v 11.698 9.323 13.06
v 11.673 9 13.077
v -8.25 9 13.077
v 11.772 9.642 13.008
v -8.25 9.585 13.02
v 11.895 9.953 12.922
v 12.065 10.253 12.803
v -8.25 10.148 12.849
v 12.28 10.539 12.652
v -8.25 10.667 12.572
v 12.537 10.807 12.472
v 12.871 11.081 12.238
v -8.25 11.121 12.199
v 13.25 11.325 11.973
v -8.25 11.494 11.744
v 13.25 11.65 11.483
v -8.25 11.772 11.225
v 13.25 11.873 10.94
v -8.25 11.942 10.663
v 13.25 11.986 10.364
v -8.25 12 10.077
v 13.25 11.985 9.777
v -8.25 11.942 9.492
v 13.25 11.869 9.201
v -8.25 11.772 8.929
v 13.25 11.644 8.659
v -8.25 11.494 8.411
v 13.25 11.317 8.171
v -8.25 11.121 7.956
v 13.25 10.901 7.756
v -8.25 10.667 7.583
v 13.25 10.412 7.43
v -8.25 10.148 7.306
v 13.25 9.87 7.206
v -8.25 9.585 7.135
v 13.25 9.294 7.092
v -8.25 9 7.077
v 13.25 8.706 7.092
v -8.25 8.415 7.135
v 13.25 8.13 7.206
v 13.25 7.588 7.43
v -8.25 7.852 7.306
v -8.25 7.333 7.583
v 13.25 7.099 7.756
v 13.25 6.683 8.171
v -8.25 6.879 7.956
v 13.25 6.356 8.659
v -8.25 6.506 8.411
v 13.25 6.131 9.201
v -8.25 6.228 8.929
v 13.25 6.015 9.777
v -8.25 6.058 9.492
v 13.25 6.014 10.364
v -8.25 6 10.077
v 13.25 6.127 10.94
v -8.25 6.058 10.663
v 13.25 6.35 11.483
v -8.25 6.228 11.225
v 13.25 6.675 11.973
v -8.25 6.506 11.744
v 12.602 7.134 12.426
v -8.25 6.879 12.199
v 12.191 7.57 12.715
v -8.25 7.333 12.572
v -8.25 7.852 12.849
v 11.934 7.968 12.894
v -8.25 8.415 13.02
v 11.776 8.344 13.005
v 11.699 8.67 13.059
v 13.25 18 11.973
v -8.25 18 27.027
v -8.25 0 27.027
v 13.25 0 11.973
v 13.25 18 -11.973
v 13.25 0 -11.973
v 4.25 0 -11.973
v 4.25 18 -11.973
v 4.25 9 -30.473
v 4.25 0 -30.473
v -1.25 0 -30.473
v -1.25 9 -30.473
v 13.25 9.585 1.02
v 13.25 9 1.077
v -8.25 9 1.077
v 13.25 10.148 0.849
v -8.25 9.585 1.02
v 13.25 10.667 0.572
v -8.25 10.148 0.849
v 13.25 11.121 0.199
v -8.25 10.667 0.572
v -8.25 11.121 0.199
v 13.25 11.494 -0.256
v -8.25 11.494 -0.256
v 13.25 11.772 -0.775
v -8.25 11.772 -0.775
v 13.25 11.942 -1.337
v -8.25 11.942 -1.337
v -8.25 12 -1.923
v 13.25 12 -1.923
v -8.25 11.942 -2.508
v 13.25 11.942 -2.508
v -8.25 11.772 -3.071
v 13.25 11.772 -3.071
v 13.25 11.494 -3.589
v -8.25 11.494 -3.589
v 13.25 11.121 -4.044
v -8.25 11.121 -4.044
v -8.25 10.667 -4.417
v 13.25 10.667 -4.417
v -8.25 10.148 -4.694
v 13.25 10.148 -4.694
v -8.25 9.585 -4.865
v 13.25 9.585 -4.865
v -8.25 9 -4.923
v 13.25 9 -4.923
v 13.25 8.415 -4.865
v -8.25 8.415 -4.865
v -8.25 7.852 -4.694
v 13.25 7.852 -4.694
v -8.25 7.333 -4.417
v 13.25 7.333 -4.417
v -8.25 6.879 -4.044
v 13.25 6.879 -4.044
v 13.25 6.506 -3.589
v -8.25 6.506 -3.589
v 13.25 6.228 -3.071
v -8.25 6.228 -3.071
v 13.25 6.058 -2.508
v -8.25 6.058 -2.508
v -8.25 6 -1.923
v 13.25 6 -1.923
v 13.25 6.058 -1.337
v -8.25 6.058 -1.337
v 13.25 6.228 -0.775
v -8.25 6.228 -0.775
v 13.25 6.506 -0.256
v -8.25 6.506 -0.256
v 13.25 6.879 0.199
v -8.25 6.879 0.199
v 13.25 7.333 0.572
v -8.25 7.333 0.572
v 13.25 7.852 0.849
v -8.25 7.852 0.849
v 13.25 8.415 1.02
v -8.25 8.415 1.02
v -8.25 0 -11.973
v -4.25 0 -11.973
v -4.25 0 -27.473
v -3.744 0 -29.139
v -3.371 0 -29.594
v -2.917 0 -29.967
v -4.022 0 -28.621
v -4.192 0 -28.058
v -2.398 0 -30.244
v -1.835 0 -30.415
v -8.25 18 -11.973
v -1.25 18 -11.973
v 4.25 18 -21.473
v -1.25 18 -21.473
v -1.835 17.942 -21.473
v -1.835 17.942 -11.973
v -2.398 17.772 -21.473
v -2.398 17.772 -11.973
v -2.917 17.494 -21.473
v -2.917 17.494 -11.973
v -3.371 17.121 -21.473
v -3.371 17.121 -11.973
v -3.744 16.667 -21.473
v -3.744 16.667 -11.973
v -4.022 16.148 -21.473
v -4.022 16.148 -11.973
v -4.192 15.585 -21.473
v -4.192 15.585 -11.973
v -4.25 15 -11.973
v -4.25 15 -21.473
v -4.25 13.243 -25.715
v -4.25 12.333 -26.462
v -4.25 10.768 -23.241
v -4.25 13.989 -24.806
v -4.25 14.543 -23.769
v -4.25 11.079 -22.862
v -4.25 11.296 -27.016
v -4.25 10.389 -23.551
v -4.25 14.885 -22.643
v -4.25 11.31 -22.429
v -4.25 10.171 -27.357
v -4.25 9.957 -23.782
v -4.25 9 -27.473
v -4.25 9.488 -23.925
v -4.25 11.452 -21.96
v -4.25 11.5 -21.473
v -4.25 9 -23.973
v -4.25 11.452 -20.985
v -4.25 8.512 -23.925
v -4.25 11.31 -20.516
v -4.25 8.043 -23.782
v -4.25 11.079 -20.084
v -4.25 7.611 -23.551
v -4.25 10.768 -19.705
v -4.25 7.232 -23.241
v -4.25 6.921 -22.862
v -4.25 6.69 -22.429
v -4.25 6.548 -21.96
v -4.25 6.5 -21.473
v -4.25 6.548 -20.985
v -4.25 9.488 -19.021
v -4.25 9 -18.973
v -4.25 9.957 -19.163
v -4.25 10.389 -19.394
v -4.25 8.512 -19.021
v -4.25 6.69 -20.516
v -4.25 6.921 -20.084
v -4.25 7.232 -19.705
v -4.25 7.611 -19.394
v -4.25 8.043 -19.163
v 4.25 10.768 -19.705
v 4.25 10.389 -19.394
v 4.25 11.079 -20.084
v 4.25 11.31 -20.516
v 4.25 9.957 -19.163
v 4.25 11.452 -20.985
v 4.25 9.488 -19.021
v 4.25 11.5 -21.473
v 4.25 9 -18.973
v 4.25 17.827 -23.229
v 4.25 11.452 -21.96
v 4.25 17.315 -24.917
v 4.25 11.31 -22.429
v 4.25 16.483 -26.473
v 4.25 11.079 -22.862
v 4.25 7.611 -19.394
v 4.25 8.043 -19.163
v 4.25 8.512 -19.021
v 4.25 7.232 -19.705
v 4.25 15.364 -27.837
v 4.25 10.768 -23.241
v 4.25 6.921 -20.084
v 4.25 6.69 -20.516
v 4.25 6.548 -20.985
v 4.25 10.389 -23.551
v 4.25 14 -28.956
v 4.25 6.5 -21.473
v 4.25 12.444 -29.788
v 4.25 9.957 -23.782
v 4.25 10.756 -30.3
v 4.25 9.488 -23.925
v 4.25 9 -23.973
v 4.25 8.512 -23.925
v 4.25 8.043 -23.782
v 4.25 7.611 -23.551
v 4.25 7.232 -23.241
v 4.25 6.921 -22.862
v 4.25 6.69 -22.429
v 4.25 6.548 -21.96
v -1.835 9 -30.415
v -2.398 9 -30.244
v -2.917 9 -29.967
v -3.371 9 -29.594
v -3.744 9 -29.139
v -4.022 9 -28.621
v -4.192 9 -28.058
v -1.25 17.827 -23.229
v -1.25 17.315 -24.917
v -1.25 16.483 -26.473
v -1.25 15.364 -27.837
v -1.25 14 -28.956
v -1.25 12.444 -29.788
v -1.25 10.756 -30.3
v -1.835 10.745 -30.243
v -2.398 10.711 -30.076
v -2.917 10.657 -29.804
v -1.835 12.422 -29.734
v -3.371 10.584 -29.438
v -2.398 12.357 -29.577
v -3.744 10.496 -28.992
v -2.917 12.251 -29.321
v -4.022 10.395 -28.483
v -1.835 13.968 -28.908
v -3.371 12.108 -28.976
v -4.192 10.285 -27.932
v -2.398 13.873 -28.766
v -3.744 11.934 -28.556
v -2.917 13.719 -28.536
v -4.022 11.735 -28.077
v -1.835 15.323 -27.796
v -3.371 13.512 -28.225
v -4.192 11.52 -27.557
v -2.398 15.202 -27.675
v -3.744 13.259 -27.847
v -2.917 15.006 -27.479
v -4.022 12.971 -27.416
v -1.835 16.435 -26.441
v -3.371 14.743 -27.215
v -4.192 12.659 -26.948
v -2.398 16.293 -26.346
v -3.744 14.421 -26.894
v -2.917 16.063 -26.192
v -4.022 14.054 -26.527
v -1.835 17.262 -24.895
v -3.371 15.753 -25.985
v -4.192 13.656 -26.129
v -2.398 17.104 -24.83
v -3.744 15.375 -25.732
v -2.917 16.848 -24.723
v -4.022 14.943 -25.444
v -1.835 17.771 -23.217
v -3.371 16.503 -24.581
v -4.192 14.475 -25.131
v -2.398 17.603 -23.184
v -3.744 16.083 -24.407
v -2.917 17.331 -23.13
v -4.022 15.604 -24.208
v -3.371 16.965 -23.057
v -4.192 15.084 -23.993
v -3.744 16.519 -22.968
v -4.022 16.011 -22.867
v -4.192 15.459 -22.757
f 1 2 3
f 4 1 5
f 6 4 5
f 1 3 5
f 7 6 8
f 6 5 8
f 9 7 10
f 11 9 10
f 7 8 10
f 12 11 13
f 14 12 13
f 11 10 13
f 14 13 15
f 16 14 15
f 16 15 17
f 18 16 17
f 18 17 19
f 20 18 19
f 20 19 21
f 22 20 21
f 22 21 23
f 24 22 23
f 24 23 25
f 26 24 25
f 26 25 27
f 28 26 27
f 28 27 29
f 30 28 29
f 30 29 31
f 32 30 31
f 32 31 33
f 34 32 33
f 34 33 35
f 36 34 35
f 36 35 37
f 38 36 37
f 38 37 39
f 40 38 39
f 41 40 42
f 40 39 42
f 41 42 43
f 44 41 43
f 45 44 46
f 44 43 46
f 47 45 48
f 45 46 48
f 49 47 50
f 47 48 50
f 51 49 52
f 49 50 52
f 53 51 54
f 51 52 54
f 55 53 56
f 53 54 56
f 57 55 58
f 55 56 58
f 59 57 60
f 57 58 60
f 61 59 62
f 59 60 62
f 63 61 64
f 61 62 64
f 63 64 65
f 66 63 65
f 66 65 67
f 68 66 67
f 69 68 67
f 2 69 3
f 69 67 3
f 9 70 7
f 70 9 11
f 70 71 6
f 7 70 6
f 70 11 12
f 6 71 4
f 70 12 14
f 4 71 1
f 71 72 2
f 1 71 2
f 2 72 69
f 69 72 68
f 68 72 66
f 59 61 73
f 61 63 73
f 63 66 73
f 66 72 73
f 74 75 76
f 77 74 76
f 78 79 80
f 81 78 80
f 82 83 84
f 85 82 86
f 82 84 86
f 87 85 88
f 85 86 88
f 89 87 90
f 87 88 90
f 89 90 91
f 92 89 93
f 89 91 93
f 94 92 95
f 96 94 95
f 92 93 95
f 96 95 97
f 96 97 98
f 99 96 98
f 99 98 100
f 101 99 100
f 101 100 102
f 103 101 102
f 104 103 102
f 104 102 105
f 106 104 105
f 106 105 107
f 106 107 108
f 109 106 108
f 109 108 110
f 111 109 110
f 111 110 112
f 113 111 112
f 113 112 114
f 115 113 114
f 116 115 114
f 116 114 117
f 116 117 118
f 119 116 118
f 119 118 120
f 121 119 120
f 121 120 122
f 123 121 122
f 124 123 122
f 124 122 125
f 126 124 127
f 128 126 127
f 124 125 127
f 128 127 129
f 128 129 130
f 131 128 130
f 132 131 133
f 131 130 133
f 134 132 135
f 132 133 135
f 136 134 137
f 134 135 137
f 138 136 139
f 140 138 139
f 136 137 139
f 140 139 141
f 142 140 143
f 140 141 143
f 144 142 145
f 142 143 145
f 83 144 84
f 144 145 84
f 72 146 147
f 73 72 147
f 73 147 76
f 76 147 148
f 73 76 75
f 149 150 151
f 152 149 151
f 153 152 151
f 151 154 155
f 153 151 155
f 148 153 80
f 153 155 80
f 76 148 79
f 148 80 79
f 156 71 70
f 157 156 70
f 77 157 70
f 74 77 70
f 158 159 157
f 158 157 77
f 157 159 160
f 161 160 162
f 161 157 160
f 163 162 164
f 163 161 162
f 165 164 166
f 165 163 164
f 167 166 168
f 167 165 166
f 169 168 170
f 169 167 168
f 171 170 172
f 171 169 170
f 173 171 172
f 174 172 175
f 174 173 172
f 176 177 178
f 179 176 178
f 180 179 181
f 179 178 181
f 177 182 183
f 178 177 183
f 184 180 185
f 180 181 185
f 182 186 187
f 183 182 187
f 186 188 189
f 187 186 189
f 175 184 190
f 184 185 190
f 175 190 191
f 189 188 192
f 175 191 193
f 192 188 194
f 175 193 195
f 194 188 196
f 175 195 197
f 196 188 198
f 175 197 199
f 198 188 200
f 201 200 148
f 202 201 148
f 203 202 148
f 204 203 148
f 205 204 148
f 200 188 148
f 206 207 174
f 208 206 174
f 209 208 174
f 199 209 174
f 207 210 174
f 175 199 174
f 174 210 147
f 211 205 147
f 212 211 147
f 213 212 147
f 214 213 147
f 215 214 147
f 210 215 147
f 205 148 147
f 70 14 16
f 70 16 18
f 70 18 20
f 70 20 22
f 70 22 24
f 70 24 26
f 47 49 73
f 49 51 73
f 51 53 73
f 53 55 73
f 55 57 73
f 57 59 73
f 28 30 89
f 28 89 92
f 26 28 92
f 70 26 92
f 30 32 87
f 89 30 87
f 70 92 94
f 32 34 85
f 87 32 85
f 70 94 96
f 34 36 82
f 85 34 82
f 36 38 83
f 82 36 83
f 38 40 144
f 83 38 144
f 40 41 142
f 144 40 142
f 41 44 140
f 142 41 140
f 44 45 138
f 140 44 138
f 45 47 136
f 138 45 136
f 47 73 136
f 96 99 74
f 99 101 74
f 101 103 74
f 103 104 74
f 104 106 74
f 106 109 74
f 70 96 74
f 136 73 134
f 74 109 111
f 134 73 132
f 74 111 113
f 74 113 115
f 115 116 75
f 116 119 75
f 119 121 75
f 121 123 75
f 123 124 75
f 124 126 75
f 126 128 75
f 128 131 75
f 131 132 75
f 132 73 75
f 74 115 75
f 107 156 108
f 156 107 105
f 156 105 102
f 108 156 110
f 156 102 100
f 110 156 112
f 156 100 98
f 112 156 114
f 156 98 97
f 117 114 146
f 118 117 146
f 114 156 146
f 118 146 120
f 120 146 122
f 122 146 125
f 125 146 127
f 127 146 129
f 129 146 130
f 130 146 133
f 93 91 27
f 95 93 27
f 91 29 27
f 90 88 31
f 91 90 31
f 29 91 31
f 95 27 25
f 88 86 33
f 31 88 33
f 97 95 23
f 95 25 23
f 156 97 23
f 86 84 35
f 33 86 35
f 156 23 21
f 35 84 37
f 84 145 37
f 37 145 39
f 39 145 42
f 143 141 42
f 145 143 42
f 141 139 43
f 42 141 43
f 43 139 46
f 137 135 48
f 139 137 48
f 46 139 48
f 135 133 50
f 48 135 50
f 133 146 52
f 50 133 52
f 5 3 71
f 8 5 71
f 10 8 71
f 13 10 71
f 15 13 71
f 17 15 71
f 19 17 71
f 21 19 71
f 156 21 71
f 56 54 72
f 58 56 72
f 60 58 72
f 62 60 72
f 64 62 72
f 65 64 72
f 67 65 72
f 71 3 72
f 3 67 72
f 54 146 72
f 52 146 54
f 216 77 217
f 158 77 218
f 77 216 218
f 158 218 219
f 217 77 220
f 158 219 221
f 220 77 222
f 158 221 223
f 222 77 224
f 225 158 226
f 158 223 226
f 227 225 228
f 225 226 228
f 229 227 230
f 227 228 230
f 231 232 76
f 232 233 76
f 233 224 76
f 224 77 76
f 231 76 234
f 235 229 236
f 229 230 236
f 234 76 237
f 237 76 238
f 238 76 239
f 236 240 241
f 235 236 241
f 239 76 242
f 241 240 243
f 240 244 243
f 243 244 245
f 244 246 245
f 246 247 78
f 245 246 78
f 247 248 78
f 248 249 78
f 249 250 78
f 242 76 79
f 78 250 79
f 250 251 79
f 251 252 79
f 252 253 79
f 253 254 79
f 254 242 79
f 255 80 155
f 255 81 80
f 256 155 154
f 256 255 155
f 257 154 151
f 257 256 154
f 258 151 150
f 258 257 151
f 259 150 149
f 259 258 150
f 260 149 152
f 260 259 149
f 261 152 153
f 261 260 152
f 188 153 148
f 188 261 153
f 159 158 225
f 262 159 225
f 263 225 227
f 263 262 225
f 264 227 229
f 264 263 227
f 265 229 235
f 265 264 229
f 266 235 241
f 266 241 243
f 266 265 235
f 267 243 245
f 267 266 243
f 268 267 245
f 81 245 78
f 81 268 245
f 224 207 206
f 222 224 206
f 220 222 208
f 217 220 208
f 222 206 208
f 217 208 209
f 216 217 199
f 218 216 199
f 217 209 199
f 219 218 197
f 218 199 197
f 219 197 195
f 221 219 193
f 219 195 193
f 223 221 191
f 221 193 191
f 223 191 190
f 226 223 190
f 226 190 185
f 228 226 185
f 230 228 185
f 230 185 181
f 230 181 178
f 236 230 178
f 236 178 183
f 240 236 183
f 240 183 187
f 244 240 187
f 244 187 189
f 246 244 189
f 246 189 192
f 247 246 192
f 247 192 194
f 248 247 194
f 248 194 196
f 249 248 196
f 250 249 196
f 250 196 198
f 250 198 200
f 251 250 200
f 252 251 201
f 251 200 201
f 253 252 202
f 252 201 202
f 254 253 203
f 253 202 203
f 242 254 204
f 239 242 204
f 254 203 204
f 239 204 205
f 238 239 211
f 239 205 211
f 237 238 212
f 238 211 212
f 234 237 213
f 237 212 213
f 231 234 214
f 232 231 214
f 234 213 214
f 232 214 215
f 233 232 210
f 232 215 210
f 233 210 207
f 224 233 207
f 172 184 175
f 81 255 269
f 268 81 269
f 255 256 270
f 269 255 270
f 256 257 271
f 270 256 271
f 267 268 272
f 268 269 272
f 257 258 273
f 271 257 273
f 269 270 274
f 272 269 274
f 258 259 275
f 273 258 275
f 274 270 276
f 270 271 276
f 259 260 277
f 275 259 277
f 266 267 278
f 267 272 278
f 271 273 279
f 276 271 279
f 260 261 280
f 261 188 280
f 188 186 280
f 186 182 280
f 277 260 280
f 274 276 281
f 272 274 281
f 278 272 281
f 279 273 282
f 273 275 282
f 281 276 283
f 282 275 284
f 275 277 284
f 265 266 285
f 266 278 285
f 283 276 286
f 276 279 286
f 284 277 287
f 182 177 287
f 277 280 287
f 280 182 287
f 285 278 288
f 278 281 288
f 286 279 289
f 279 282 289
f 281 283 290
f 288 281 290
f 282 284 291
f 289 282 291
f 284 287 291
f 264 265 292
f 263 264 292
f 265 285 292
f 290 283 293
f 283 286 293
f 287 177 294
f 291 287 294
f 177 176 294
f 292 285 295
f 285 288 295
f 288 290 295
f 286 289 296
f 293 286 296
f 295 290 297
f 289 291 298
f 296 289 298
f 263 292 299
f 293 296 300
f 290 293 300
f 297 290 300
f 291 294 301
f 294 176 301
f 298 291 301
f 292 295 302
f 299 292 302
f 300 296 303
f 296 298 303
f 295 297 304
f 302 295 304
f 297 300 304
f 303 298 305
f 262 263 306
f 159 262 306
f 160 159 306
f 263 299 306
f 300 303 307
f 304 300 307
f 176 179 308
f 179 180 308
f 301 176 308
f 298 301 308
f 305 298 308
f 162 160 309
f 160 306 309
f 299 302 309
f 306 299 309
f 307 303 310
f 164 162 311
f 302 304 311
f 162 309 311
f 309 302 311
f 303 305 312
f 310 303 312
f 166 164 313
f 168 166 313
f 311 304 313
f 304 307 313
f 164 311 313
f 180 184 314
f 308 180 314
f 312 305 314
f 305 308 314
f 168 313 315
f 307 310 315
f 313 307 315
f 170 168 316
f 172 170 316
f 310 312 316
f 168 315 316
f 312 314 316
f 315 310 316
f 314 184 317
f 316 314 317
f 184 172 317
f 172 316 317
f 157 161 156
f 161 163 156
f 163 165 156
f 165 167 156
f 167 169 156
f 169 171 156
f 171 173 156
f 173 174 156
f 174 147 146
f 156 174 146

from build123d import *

# Parameters (mm, degrees)
BOSS_EXTRUDE1_DEPTH = 18
SKETCH3_R           = 2.5
SKETCH3_R_2         = 3
CUT_EXTRUDE1_DEPTH  = 42.41062241
FILLET1_R           = 3


with BuildPart() as part:
    # Sketch1 → Boss-Extrude1 (new body)
    with BuildSketch(Plane(origin=(0, 0, 0), x_dir=(1, 0, 0), z_dir=(0, 1, 0))):
        Polygon((-8.25, 11.972768964), (-8.25, -27.027231036), (13.25, -11.972768964), (13.25, 11.972768964), (4.25, 11.972768964), (4.25, 30.472768964), (-4.25, 30.472768964), (-4.25, 11.972768964), align=None)
    extrude(amount=BOSS_EXTRUDE1_DEPTH)

    # Sketch3 → Cut-Extrude1 (cut, through all)
    with BuildSketch(Plane.ZY.offset(8.25)):
        with Locations((-21.472768964, 9)):
            Circle(SKETCH3_R)
        with Locations((-1.922768964, 9)):
            Circle(SKETCH3_R_2)
        with Locations((10.077231036, 9)):
            Circle(SKETCH3_R_2)
        with BuildLine():
            Line((-30.472768964, 9), (-30.472768964, 18))
            Line((-30.472768964, 18), (-21.472768964, 18))
            ThreePointArc((-21.472768964, 18), (-27.836729995, 15.363961031), (-30.472768964, 9))
        make_face()
    extrude(amount=-CUT_EXTRUDE1_DEPTH, mode=Mode.SUBTRACT)

    # Fillet1
    fillet1_edges = [part.edges().sort_by_distance(p)[0] for p in [
        (-4.25, 18, -16.722768964),
        (-4.25, 4.5, -30.472768964),
        (-4.25, 15.363961031, -27.836729995),
    ]]
    fillet(fillet1_edges, radius=FILLET1_R)


solid = part.part
